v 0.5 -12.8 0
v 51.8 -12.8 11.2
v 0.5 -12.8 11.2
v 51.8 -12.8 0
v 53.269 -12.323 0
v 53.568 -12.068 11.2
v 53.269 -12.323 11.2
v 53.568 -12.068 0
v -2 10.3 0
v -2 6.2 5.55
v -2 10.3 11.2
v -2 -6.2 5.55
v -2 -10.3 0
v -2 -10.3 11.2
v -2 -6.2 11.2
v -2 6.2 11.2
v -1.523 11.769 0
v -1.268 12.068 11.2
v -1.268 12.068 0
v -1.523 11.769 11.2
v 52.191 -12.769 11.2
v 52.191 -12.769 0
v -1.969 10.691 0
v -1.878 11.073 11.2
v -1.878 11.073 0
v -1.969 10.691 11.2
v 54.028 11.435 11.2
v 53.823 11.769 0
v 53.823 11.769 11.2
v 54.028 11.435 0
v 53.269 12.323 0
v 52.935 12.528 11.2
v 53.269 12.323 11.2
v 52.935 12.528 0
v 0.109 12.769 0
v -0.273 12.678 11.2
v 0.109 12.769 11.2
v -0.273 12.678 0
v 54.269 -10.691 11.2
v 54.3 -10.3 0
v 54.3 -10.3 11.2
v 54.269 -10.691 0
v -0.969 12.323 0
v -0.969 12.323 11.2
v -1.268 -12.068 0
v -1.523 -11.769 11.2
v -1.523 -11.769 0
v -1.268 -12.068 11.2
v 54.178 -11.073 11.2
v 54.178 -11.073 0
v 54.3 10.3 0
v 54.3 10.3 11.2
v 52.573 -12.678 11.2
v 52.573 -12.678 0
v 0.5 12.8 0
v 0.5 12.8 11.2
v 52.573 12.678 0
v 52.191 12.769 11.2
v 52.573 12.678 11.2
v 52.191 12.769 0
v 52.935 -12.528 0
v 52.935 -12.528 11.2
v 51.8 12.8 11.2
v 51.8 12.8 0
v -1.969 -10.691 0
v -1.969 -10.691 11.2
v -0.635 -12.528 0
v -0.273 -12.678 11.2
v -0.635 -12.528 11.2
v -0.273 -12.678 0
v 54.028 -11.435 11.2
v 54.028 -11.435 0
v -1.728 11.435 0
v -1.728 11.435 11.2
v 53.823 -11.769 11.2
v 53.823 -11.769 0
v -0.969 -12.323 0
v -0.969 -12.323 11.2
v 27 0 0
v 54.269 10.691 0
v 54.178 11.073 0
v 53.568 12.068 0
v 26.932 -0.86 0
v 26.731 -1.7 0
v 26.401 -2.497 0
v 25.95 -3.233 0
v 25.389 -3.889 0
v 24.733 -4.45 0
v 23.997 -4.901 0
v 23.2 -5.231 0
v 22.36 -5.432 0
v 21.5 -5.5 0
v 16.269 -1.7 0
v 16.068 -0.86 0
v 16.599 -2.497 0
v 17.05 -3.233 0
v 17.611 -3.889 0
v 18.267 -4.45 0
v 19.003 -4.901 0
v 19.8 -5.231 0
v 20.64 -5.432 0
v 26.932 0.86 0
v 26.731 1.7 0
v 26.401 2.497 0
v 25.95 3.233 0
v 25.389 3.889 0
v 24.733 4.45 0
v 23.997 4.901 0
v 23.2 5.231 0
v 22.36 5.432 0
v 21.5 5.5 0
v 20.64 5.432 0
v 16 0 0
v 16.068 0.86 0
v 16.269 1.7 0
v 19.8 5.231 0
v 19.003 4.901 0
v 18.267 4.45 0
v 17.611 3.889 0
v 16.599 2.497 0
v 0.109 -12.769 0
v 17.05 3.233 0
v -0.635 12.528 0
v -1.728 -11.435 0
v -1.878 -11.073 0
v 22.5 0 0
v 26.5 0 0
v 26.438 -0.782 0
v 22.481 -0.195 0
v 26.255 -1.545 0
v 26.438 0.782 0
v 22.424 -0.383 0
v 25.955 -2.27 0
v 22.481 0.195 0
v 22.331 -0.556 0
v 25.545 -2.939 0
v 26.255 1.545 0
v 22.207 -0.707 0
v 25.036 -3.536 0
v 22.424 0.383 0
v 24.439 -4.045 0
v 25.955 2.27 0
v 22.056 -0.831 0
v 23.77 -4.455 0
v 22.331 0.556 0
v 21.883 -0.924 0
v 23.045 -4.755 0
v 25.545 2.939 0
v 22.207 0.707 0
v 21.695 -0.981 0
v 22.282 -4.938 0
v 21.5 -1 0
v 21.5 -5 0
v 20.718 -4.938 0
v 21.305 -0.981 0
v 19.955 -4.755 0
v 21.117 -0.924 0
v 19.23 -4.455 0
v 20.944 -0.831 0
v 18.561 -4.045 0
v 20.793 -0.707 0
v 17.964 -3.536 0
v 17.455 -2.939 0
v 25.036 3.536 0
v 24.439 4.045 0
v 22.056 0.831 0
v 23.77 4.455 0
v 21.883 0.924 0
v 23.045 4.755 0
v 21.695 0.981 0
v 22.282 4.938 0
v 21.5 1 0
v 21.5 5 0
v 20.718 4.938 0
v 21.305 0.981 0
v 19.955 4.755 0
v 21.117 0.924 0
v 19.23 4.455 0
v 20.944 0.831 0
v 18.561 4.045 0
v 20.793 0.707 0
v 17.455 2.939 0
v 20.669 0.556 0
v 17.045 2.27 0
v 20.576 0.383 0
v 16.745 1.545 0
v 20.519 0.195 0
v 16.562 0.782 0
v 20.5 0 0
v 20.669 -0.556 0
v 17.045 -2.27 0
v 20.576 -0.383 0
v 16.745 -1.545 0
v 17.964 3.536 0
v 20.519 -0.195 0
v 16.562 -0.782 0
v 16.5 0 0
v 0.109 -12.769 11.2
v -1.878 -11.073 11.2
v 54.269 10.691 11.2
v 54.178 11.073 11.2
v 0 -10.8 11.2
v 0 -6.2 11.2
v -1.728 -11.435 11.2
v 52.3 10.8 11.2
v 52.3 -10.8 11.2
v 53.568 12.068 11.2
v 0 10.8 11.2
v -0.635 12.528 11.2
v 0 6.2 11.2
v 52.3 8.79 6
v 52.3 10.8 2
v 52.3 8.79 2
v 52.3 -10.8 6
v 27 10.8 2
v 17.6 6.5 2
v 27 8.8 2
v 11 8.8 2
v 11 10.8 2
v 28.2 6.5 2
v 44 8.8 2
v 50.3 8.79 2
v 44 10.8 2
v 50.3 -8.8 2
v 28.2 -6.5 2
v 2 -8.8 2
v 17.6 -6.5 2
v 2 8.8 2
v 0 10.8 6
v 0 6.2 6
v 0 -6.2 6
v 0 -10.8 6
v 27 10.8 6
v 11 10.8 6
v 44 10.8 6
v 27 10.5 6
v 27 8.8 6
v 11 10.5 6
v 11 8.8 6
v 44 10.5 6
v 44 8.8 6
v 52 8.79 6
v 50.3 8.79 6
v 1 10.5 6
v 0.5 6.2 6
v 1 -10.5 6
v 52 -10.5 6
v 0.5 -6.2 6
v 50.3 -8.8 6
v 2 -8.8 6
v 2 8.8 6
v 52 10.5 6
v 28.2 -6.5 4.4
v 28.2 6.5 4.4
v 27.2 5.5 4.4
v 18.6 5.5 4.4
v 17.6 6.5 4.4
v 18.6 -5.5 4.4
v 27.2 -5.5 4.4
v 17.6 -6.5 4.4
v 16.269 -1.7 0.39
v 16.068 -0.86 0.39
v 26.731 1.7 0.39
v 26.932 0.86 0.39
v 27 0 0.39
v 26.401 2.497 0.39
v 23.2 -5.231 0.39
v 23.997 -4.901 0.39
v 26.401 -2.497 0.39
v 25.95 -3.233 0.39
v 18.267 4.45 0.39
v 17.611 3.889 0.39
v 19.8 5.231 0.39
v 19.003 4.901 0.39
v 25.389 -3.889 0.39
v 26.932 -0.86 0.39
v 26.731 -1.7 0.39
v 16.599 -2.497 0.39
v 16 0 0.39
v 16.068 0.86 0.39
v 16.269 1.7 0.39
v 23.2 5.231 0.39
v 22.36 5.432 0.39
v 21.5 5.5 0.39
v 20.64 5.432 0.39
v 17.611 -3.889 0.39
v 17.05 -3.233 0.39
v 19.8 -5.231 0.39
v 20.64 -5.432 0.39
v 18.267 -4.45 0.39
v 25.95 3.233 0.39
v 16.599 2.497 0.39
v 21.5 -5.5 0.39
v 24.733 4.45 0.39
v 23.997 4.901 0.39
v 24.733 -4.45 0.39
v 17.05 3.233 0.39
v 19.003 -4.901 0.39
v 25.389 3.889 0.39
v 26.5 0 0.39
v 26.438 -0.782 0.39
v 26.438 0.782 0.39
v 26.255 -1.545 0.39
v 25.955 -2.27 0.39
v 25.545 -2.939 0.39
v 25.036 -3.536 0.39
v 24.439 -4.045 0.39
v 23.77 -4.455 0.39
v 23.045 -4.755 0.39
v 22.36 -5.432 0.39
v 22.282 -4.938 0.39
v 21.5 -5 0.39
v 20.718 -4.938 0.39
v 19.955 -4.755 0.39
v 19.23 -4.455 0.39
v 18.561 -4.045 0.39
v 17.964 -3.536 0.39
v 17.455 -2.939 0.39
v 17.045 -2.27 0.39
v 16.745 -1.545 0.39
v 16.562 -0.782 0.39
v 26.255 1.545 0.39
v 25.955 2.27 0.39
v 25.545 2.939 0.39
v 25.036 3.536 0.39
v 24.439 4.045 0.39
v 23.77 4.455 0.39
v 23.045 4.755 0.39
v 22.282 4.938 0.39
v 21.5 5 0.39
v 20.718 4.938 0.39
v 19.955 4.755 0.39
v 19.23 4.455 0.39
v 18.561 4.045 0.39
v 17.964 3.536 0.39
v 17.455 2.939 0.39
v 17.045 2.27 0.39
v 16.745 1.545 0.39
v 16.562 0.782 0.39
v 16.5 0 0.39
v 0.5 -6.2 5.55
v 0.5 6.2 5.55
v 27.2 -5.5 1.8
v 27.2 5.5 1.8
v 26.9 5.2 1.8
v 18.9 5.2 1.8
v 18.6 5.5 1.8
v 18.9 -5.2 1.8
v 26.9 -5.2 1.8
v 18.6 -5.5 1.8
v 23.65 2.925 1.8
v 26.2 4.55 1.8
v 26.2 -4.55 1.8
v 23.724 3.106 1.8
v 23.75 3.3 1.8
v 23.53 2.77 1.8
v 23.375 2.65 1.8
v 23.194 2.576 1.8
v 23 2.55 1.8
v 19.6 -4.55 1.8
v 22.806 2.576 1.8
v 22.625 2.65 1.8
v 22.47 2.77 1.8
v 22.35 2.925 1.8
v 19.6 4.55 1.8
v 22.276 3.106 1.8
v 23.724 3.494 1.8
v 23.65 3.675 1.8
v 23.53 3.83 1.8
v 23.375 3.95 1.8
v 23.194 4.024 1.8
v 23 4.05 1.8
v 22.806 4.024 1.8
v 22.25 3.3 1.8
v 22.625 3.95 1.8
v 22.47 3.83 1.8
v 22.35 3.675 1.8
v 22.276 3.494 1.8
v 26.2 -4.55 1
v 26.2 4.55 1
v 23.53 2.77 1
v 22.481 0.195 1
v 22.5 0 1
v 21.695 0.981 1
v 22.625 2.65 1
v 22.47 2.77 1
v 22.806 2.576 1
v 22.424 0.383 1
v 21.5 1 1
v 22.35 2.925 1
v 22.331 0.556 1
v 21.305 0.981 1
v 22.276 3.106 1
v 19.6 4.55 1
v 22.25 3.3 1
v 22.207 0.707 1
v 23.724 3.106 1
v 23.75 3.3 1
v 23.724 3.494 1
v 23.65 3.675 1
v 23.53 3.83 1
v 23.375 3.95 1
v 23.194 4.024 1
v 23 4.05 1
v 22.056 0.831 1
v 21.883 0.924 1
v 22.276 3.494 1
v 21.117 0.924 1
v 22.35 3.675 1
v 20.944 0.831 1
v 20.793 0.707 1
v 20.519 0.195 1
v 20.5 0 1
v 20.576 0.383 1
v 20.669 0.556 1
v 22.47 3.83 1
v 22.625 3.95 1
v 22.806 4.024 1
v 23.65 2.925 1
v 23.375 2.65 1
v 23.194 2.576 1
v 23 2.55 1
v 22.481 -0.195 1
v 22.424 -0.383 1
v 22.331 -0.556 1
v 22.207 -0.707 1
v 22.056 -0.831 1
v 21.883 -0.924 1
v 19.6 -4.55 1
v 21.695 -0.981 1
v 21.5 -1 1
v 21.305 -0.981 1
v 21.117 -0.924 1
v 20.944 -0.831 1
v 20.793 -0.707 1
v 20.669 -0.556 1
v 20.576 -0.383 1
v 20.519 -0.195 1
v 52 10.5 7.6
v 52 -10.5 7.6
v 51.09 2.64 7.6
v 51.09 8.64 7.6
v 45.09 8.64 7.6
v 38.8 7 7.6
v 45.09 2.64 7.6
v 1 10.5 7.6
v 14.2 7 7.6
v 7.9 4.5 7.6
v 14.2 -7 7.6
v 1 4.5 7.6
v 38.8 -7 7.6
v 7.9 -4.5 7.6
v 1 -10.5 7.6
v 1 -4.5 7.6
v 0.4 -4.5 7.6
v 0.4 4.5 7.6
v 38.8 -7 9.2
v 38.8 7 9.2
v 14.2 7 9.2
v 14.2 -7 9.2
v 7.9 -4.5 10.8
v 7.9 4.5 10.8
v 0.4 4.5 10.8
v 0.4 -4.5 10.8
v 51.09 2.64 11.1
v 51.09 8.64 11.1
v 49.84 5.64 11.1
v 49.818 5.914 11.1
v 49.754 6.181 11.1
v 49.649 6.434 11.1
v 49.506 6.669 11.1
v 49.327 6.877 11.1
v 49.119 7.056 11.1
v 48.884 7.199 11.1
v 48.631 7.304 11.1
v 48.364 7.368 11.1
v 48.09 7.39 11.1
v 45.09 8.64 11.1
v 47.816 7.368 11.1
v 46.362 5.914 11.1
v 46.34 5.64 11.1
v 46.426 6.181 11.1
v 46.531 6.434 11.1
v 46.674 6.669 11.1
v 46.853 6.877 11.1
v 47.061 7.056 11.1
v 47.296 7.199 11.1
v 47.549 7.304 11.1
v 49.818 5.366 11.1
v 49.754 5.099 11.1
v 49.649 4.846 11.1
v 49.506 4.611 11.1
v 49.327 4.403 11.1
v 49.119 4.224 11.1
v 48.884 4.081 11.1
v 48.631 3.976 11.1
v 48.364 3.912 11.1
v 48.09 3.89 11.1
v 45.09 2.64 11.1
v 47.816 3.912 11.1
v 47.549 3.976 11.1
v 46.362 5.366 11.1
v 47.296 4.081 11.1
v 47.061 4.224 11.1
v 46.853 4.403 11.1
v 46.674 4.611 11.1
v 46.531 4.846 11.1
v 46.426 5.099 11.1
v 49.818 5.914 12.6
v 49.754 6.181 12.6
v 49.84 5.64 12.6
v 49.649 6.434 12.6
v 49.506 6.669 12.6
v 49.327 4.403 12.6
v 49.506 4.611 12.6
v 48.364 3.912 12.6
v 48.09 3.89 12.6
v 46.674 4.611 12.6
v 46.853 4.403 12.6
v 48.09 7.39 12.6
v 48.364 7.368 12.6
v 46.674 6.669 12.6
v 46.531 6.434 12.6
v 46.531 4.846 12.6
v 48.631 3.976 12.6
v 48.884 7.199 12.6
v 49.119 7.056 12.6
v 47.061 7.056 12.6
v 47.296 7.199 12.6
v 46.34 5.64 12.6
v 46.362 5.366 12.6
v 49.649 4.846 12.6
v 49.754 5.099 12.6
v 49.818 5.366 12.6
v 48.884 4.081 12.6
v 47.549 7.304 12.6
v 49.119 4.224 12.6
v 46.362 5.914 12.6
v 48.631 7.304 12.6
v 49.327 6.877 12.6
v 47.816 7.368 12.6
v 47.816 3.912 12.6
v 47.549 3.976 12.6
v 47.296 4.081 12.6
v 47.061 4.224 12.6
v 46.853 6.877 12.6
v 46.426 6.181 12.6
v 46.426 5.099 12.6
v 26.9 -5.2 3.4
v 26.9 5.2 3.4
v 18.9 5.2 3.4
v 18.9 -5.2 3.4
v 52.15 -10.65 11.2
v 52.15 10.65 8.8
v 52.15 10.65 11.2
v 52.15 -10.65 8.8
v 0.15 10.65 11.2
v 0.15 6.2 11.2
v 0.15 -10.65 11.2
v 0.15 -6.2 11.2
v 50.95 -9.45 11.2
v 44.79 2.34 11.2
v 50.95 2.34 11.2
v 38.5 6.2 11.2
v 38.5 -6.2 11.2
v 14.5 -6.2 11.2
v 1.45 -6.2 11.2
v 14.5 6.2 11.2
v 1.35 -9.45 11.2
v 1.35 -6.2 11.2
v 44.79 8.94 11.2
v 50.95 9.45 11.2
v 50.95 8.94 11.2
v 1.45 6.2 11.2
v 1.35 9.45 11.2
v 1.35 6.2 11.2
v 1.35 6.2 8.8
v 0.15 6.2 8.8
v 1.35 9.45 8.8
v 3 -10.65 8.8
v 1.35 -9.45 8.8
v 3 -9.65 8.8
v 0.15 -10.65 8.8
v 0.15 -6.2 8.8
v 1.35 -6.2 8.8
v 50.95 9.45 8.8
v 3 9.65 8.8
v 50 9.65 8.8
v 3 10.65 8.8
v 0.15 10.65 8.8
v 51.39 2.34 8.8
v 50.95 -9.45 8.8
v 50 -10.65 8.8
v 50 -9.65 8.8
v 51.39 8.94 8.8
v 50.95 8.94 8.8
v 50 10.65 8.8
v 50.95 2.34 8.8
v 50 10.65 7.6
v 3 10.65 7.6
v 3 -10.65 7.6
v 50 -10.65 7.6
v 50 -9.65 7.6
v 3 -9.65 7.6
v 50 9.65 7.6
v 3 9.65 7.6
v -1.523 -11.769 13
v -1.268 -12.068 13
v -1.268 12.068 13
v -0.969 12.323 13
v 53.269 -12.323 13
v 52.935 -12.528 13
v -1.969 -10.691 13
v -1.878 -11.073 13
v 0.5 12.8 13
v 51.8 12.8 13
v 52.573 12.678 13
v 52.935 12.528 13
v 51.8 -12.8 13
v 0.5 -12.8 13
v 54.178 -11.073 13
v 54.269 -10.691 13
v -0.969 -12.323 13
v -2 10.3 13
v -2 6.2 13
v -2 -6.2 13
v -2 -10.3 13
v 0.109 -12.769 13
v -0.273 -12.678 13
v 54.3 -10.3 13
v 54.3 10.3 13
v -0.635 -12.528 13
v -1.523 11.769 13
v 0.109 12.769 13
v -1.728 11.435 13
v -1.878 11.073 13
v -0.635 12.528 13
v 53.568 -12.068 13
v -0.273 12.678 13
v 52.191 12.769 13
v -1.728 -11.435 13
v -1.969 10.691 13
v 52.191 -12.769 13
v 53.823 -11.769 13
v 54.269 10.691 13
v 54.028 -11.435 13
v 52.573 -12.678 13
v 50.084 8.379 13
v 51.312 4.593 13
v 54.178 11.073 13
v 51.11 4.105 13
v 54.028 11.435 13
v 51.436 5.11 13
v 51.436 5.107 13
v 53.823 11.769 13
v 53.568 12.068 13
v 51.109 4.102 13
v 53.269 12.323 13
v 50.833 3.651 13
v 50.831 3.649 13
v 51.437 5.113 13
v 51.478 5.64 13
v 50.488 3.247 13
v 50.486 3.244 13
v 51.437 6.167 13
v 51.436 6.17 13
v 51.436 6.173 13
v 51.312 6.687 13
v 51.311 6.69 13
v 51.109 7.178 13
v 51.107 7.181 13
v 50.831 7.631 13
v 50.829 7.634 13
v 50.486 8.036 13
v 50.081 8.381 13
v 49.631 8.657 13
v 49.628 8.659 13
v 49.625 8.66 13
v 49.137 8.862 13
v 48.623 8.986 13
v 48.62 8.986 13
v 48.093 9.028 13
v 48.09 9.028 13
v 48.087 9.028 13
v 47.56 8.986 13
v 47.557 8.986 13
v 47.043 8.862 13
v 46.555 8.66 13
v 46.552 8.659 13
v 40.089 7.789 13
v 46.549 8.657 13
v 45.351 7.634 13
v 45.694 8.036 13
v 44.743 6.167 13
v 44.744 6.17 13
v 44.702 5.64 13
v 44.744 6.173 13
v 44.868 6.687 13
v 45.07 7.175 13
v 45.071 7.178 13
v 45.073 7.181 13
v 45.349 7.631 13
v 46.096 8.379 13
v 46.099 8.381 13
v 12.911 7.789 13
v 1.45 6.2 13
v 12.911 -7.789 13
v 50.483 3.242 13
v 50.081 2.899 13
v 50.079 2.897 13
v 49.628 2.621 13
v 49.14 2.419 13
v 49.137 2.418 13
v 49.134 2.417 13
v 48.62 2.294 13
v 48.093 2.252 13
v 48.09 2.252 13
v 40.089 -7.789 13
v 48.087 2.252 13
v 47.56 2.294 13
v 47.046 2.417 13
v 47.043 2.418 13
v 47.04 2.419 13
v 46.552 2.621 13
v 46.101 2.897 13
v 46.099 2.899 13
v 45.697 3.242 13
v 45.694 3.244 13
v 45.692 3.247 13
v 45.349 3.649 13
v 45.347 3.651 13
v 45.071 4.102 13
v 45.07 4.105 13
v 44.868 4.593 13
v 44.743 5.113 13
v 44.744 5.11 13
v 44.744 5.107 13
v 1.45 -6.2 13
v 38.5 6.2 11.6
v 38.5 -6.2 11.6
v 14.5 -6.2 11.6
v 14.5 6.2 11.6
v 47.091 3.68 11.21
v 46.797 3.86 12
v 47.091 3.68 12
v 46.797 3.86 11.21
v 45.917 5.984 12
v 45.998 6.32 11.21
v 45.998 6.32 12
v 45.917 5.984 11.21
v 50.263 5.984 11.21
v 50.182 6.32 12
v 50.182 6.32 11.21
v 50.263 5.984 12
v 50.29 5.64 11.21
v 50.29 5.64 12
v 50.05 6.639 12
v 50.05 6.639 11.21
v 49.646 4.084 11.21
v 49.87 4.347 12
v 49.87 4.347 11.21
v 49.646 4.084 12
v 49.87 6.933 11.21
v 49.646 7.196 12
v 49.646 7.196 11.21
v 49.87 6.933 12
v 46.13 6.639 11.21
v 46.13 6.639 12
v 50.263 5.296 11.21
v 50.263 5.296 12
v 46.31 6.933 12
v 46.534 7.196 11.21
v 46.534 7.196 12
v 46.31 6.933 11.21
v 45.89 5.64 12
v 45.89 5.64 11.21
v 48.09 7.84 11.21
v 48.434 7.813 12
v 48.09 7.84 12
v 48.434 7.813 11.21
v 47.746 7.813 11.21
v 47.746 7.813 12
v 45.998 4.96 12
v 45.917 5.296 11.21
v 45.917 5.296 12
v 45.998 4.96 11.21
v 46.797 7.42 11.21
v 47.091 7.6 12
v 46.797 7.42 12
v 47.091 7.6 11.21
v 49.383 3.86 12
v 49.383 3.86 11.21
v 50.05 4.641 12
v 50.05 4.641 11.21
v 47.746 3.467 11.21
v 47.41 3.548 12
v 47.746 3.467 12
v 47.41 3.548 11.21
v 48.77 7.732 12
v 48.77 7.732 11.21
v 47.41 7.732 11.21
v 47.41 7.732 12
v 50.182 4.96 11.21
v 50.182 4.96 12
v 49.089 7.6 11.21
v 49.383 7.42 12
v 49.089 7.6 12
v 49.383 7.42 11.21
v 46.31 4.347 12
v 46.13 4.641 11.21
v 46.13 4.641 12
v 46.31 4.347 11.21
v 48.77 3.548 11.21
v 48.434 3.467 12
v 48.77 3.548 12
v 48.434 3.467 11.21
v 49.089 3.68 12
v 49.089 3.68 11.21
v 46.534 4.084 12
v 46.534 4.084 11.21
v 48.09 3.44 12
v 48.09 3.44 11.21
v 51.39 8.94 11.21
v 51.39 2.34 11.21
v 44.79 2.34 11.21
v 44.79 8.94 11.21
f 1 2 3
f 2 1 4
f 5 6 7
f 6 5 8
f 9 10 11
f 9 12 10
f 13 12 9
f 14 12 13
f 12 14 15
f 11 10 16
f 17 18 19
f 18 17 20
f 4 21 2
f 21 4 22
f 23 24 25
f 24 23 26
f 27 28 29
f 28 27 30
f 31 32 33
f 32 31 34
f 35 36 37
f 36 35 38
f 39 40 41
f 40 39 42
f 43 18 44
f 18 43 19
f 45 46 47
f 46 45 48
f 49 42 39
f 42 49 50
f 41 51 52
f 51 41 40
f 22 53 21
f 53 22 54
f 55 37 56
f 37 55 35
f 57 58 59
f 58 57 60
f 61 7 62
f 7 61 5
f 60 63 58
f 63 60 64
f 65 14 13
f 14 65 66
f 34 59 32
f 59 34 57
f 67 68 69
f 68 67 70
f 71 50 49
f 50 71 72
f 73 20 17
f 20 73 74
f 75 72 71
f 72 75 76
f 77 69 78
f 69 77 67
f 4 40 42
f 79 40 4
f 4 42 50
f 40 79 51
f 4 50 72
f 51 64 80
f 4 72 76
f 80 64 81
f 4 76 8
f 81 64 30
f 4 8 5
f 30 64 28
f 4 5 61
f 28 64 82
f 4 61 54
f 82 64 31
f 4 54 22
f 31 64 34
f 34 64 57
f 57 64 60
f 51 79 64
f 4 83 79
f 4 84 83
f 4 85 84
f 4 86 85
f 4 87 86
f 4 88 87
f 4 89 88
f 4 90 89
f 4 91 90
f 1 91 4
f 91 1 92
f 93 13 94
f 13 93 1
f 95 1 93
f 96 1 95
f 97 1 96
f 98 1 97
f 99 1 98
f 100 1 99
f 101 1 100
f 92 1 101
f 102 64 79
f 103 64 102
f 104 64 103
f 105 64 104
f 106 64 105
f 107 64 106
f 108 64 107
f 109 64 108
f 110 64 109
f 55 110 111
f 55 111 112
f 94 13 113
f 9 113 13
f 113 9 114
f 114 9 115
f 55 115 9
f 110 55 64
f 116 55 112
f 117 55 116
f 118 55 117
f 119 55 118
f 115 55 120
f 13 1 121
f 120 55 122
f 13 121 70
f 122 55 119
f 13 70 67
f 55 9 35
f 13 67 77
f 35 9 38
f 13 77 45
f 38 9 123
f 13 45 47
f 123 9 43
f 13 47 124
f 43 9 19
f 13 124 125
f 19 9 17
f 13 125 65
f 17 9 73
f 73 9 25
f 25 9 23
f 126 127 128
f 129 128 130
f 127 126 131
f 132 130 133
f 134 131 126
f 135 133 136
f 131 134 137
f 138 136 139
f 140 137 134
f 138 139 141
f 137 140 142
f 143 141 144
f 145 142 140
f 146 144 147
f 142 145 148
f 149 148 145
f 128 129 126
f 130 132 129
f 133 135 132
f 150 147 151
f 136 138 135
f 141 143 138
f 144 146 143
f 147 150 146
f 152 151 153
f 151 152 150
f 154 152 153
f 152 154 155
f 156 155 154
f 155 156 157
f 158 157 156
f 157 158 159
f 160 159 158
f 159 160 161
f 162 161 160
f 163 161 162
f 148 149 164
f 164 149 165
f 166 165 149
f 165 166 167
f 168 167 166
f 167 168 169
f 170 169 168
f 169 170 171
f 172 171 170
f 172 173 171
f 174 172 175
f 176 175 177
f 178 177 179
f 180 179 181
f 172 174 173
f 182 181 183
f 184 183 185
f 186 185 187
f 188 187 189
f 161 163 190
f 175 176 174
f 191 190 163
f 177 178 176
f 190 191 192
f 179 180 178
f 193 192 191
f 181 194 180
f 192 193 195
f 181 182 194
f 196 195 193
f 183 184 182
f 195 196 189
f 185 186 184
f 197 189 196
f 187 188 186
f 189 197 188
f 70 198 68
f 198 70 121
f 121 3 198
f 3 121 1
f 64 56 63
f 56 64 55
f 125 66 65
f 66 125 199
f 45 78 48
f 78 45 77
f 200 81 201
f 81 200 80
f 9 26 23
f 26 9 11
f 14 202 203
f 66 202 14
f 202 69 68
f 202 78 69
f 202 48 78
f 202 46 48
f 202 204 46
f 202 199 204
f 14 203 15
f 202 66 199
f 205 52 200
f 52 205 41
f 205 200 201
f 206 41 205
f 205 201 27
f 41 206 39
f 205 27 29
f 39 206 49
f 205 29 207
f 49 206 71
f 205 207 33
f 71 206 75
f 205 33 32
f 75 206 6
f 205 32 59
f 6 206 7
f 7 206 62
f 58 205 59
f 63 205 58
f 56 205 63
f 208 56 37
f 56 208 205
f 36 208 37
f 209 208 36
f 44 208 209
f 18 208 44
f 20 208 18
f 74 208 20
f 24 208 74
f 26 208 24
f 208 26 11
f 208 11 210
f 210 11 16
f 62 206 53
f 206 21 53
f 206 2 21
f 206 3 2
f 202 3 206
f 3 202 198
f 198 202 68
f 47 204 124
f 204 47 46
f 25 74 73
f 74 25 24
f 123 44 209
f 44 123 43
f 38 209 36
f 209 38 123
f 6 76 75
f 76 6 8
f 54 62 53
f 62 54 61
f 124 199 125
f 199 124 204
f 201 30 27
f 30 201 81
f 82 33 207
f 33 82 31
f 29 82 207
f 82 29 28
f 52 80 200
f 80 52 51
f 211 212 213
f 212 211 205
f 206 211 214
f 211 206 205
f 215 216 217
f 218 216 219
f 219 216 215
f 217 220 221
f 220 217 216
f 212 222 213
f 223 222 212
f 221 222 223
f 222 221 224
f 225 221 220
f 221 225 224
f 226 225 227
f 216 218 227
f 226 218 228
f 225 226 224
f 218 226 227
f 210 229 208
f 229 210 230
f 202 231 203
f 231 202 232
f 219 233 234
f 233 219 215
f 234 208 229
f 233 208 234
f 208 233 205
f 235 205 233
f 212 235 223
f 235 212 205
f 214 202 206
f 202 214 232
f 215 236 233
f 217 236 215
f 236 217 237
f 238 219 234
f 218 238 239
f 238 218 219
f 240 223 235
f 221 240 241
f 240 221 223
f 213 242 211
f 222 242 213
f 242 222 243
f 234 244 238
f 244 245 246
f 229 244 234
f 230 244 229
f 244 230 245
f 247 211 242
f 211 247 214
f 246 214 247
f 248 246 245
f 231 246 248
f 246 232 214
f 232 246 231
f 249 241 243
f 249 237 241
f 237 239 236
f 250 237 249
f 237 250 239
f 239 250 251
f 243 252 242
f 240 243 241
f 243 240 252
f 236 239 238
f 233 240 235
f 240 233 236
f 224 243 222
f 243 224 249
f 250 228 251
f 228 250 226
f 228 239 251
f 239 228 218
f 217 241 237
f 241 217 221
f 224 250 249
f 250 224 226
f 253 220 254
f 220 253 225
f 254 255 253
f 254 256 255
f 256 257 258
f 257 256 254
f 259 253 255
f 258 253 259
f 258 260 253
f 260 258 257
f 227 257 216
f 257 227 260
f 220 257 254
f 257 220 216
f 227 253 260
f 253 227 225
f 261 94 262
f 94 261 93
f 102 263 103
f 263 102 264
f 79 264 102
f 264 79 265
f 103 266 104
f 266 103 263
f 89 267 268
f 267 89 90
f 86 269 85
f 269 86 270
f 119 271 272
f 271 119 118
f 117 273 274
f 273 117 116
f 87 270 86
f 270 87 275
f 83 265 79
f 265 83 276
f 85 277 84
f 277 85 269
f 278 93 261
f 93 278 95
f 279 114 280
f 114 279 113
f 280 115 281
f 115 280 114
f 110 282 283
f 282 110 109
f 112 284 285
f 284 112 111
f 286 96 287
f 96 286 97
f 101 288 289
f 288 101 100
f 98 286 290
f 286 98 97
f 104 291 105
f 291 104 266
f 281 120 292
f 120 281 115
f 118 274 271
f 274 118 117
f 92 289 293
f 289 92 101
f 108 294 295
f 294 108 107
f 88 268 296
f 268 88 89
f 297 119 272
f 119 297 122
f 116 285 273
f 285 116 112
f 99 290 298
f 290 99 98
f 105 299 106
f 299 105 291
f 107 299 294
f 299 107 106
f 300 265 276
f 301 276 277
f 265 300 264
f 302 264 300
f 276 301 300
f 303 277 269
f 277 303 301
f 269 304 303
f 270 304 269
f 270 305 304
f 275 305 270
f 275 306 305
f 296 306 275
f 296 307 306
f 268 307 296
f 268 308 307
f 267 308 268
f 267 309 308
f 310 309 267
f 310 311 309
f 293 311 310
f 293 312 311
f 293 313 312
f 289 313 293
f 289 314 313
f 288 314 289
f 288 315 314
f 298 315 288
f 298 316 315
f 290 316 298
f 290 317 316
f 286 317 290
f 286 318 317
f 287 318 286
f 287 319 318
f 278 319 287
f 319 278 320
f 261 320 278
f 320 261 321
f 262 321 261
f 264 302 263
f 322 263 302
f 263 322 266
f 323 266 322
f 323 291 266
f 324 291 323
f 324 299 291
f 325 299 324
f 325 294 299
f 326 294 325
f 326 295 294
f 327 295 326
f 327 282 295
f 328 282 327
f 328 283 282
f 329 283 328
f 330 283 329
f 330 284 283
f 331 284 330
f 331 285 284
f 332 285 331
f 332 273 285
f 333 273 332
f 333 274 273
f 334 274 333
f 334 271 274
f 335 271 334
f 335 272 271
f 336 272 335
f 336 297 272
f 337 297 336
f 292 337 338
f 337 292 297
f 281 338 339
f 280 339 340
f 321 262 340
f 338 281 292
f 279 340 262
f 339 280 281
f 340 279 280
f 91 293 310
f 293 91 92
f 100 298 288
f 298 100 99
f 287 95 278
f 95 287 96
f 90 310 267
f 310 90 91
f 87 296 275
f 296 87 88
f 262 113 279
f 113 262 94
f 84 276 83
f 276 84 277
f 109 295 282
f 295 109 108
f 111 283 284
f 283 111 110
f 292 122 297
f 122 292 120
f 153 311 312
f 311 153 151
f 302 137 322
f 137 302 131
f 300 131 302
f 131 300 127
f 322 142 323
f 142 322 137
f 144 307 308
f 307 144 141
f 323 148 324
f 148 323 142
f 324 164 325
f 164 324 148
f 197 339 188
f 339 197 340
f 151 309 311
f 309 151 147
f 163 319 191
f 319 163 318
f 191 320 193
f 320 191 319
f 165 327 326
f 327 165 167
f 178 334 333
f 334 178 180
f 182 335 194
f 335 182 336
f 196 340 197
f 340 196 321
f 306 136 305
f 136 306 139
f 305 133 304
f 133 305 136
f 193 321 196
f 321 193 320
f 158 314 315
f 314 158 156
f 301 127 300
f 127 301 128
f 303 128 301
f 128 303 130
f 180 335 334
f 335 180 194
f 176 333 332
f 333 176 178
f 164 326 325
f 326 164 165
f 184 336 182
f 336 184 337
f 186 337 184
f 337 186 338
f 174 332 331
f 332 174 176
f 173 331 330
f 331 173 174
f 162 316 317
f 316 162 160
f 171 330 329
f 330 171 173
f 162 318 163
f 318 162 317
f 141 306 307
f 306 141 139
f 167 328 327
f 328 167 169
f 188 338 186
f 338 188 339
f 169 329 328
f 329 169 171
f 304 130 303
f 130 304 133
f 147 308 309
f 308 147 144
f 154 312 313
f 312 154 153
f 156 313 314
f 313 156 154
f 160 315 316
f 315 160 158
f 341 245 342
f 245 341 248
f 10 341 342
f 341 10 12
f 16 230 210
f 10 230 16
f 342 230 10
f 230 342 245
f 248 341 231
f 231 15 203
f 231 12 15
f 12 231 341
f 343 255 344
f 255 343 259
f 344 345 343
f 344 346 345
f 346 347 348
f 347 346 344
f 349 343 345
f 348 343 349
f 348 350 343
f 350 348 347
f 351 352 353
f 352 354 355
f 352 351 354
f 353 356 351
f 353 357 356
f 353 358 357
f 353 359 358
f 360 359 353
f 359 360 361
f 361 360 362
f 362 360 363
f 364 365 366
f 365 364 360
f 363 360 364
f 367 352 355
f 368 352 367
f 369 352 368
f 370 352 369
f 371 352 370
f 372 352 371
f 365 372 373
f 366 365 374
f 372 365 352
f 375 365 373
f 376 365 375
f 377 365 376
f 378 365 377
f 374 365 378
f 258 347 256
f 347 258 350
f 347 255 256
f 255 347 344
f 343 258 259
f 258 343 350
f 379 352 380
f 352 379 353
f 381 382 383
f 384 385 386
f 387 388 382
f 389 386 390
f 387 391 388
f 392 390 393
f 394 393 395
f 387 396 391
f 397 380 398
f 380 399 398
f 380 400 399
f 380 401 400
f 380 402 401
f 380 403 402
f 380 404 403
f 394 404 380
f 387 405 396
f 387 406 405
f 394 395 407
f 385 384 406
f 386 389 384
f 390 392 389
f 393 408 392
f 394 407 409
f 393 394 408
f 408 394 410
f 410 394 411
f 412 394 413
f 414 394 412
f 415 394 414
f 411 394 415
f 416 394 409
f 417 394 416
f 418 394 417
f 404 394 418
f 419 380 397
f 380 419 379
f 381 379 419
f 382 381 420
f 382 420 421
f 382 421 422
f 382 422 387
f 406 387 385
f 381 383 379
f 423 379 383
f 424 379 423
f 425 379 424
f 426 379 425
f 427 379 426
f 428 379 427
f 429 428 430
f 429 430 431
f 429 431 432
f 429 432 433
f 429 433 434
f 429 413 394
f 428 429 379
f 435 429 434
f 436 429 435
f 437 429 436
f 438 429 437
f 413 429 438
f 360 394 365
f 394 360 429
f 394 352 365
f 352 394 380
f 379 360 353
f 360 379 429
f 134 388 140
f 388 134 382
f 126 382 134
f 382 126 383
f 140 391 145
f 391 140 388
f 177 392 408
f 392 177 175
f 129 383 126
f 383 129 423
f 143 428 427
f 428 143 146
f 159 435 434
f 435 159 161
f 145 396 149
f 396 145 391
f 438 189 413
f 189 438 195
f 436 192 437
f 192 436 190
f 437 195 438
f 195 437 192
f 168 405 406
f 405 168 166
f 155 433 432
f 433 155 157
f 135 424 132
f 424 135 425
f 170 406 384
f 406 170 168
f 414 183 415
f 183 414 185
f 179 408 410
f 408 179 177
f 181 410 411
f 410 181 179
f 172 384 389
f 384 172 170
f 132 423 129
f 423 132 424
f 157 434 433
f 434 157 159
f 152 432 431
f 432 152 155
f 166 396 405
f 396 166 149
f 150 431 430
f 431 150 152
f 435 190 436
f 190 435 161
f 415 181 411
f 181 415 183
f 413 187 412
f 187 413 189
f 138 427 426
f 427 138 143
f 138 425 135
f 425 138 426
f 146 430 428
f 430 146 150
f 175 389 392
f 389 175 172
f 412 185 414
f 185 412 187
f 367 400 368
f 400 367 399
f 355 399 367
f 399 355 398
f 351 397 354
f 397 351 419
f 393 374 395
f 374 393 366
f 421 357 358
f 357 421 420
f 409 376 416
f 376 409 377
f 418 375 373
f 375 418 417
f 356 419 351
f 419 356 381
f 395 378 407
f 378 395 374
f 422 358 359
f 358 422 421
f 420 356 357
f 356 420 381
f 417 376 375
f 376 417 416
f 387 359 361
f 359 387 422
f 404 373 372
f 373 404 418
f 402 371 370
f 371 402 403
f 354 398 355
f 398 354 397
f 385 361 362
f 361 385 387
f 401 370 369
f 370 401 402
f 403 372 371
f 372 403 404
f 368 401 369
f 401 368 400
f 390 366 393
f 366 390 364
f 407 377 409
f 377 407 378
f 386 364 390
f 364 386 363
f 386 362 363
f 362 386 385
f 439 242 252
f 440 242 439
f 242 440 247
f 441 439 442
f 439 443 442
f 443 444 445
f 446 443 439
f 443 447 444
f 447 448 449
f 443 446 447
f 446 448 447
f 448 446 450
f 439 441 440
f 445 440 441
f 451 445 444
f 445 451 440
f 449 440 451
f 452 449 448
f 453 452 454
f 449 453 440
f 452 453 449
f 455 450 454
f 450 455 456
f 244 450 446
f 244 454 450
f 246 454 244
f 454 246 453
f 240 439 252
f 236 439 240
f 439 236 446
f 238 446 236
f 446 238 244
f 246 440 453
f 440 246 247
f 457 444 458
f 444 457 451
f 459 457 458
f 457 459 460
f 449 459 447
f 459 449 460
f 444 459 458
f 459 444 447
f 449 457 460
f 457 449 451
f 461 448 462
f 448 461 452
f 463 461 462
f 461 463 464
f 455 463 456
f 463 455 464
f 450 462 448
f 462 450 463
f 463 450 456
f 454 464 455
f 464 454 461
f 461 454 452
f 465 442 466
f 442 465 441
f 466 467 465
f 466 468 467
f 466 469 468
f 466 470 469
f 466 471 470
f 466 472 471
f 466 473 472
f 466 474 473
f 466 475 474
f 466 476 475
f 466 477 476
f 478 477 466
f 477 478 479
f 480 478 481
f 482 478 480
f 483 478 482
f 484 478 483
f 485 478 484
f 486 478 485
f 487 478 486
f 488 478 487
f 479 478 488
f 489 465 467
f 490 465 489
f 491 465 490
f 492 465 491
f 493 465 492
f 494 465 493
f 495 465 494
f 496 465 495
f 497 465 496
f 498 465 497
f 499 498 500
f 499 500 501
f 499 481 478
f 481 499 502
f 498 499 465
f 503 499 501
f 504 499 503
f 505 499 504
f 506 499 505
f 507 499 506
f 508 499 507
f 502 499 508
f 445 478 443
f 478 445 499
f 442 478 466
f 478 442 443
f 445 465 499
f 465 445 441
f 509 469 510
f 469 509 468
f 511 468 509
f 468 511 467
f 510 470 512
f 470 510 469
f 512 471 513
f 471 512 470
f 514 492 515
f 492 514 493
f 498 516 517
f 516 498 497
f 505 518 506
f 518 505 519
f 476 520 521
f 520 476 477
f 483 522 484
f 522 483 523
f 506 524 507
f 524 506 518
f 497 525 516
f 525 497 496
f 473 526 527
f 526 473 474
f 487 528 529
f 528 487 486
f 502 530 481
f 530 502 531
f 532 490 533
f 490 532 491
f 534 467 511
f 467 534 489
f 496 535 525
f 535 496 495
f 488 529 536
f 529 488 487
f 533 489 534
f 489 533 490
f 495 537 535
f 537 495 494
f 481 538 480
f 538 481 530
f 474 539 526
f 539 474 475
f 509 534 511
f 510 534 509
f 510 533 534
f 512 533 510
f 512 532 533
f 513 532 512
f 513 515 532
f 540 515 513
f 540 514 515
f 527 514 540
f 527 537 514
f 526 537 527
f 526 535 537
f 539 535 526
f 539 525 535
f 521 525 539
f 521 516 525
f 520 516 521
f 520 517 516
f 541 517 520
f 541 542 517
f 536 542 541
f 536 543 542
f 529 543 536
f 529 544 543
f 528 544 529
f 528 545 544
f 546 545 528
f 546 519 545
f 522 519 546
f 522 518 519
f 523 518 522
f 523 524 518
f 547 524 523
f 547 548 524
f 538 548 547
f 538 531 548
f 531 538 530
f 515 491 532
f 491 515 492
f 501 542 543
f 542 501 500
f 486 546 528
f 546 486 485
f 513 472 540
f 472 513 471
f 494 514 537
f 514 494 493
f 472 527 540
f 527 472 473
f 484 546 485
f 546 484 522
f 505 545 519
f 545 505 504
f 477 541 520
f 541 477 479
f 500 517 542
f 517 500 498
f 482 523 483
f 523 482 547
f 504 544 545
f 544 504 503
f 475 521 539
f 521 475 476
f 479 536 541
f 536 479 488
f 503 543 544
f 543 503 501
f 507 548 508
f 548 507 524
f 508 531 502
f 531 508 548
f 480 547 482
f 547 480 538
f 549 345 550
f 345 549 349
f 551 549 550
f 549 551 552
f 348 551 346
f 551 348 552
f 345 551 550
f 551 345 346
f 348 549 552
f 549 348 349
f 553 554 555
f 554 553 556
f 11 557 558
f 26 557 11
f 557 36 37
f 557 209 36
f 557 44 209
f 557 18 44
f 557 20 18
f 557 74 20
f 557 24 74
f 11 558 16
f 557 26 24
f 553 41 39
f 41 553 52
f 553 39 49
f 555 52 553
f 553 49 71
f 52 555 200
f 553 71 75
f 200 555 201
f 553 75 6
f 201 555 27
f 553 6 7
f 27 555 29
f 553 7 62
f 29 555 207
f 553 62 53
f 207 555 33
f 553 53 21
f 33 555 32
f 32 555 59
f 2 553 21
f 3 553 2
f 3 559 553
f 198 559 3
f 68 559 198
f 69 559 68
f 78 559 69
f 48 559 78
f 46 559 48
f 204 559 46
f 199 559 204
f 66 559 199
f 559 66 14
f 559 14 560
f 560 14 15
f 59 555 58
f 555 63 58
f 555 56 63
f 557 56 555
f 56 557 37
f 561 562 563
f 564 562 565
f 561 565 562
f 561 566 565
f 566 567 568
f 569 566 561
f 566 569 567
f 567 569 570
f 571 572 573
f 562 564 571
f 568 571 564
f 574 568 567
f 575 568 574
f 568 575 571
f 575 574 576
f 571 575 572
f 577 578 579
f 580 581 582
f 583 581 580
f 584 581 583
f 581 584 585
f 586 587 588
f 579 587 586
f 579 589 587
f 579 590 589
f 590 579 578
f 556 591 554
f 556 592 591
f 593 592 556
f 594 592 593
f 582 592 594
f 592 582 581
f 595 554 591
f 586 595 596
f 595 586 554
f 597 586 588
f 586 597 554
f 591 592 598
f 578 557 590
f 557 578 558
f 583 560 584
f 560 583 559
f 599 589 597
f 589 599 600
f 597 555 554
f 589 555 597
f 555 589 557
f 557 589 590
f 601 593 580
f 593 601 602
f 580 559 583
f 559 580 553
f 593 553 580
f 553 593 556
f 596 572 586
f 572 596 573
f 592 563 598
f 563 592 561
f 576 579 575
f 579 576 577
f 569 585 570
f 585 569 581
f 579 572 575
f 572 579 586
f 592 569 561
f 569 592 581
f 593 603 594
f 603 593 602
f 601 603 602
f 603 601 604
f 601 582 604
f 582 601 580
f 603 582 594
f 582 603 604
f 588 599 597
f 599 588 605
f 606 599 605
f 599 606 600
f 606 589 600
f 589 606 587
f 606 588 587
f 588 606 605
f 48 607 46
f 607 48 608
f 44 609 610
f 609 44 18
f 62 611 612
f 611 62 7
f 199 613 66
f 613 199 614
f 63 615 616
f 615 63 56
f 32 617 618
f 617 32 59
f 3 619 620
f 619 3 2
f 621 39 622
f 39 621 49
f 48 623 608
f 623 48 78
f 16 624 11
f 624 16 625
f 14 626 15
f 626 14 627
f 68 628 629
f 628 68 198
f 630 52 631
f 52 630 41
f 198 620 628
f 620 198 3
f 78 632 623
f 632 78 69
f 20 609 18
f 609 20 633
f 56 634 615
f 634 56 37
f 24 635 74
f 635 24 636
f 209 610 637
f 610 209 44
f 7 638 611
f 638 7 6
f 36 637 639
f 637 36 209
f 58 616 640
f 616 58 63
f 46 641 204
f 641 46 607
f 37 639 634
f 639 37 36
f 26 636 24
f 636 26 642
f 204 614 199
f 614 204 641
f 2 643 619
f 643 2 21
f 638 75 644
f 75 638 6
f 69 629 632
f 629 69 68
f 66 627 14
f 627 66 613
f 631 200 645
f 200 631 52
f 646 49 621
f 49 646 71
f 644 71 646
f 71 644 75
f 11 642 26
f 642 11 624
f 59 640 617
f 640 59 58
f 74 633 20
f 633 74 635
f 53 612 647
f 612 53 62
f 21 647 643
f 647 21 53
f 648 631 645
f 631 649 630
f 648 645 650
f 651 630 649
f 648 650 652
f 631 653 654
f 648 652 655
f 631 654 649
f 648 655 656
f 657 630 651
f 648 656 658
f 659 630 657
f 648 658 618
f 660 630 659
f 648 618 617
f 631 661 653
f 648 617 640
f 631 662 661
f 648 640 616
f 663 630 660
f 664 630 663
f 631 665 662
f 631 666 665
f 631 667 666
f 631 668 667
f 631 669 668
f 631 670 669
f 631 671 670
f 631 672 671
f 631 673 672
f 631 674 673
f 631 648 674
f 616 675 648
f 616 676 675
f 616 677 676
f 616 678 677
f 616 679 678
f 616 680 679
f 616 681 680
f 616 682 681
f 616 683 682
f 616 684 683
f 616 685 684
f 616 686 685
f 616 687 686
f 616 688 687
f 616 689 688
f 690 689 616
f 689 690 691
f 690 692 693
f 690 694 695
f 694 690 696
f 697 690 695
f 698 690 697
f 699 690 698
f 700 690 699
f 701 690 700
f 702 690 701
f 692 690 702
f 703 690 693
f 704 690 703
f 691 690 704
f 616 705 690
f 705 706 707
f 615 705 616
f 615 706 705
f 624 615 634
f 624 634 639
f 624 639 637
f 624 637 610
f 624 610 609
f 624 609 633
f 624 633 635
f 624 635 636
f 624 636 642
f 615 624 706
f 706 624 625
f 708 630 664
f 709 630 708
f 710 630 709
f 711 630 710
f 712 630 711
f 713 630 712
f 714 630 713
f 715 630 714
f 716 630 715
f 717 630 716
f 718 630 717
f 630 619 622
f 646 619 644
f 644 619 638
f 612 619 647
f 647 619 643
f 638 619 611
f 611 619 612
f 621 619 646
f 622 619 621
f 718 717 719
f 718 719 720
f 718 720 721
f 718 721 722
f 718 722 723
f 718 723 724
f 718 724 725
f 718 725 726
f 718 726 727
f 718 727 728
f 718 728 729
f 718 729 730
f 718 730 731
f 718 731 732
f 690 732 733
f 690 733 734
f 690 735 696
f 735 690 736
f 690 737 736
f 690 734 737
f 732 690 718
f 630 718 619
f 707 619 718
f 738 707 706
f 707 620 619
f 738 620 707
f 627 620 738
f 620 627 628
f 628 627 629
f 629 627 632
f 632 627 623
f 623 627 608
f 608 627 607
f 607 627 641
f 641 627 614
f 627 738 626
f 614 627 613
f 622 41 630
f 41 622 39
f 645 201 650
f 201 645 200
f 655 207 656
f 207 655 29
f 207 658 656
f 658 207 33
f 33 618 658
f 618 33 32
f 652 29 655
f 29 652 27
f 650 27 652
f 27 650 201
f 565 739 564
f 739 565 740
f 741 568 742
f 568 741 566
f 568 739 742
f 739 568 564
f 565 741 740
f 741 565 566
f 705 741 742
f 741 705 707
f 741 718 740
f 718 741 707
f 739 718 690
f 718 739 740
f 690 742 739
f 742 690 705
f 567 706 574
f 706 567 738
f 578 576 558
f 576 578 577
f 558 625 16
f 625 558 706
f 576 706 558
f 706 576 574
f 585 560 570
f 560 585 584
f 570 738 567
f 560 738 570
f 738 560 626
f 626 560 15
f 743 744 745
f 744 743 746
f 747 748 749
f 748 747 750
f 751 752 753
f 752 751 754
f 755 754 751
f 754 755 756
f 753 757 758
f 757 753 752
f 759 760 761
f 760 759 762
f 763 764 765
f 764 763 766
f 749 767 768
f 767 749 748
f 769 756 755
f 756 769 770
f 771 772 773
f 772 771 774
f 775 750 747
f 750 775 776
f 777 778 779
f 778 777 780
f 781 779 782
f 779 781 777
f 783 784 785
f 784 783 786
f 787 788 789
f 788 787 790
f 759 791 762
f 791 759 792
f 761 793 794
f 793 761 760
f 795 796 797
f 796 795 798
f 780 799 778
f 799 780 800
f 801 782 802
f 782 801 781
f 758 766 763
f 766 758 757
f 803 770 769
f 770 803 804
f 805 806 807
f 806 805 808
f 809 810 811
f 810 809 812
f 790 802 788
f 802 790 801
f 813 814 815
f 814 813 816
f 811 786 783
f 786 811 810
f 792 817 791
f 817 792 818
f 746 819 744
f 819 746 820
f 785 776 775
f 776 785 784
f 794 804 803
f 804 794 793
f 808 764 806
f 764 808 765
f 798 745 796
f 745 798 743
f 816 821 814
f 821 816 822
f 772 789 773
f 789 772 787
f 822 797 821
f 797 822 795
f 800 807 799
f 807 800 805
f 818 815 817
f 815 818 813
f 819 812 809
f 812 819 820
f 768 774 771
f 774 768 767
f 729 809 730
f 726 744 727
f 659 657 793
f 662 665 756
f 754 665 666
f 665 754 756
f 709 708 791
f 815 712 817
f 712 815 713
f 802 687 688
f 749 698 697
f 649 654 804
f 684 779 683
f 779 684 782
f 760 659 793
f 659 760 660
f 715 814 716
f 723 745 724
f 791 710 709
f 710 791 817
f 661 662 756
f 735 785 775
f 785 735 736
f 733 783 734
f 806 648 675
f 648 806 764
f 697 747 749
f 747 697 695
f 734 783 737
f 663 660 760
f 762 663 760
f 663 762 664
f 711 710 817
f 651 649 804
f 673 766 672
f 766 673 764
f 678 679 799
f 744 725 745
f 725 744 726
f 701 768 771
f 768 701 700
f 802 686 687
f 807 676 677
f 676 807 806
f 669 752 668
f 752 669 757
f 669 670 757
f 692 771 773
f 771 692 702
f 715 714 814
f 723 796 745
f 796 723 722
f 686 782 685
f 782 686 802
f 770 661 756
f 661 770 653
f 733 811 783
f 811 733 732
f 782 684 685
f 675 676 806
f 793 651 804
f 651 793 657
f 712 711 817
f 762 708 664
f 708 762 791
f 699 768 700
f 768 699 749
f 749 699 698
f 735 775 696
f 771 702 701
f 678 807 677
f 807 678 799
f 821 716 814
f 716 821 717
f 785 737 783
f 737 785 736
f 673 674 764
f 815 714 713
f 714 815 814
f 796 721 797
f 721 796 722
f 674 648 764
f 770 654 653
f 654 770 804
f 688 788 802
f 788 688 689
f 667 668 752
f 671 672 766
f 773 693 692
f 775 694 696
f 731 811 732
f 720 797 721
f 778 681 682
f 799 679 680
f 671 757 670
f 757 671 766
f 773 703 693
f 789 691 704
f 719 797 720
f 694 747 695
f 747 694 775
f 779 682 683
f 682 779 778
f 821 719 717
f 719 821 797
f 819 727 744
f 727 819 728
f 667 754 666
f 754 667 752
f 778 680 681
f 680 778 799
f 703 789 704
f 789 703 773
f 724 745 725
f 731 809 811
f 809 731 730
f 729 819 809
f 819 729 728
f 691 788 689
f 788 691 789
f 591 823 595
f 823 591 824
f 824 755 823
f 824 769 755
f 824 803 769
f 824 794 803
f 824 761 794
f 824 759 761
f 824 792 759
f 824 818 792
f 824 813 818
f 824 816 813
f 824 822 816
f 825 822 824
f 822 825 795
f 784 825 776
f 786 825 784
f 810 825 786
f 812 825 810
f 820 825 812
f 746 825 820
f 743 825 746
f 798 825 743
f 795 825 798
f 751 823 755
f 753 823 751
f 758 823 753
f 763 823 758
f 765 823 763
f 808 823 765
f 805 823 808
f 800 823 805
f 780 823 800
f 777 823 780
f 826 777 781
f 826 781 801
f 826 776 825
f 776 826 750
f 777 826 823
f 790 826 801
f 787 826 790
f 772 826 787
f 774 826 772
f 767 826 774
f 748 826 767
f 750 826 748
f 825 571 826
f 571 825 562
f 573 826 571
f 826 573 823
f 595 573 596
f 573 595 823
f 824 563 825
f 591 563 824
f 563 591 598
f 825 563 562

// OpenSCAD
// Latency tester v3 case - Waveshare RP2040-LCD-0.96 + ALS-PT19 + 6x6 button
// The screen faces you through the lid; the light sensor looks out of the flat
// back. Hold the back against the monitor. The button is soldered straight onto
// the board (legs in pins 21 GP16 and 23 GND, body towards the middle of the
// board) and pokes through a hole in the lid. The light sensor lies face-down in
// a pocket in the back, under the board.
//
// About 57 x 26 x 13 mm. Screwless: the lid's lip is a push fit (a drop of glue
// or a strip of tape if it's loose on your printer).
//
// Parts (set PART):
//   "base" - back: board ledge, USB-C opening, sensor pocket
//   "lid"  - front: screen window, button hole. Exported face-down, ready to print.
//   "all"  - assembly preview
//
// Wiring: no header pins on the board (solder wires into the holes from
// underneath). If your board has pins soldered on, set under = 9.5.
//
// CHECK BEFORE PRINTING - measure your board and set these if they differ:
//   scr_x    distance from the board's USB end to the centre of the screen
//   scr_y    offset of the screen centre across the board (0 = centred)
//   btn_x    distance from the board's USB end to the centre of the button stem
//   btn_y    stem centre from the board's centre line, towards the pin 21-40 edge
//   tact_h   button height, bottom of the body to the top of the stem
//   sens_x   where the sensor sits under the board, from the USB end - keep it
//   sens_y   clear of anything on the board's underside (battery socket)

PART = "all";
$fn = 40;

// ---------- board ----------
bd = [51, 21];          // board outline (x along the length, USB at x = 0)
bd_t = 1.6;             // PCB thickness
top_h = 3.6;            // tallest part on top (USB-C, screen, BOOT/RESET) + clearance
under = 4;              // space under the board for wire ends
fit = 0.3;              // board clearance
scr_x = 25.5;           // screen centre from the USB end
scr_y = 0;
scr_win = [24, 12.4];   // window at the screen (active area is 21.7 x 10.8)
usb_w = 12.4;           // USB-C plug overmould width
usb_h = 7.4;            // ... and height

// ---------- case ----------
wall = 2;
floor_t = 2;
lid_t = 1.8;
lip = 1.2;              // lid lip width
lip_d = 2.4;            // lid lip depth
lid_fit = 0.15;         // lip clearance (push fit)

// ---------- button (standard 6 x 6 mm tactile, 4 legs) on the board ----------
// Pins 21 and 23 are 5.08 mm apart; with those two legs in them the stem sits
// 3.25 mm in from the pin row.
btn_x = 25.5 + (24.13 + 19.05) / 2;     // = 47.1, midway between pins 21 and 23
btn_y = 8.89 - 3.25;                    // = 5.64
tact_h = 5;             // 5 mm button: stem top ends 0.4 mm under the lid face
btn_hole = 4.4;         // stem is 3.5 mm
btn_body = 6.6;         // clearance for the 6 x 6 body under the lid

// ---------- ALS-PT19 (Adafruit 2748) ----------
// Pocket: the breakout lies face-down on a ledge; a smaller recess under it
// clears the sensor chip; a 2 mm hole lets the light in; a peg goes through
// the breakout's mounting hole to line it up.
als = [8.0, 10.4];      // breakout size, long side across the case
sens_x = 21.9;          // pocket centre from the board's USB end
sens_y = 0;
als_fit = 0.3;
als_frame = 1.0;
als_skin = 1.0;         // back thickness under the chip
als_ledge = 1.8;        // height of the ledge the breakout rests on
als_recess = [6.6, 9.1];// chip recess
win_d = 2.0;            // light hole
win_off = [-1.4, 0];    // light hole from the pocket centre
peg_d = 1.5;            // locating peg
peg_off = [0.1, 3.3];
peg_h = 1.4;            // above the ledge (breakout PCB is 1.6)

// ---------- board ledge ----------
ledge_w = 2.0;          // ledge round the inside the board rests on
// gaps in the ledge for solder joints under the board (pins 31-36 sensor wires,
// pins 21-23 button legs), x from the board's USB end, on the pin 21-40 side
ledge_gaps = [[10, 26], [43, 51.5]];

// =====================================================================
bx0 = 1.0;                              // board starts 1 mm from the USB wall (connector overhang)
bx1 = bx0 + bd[0];
iy = bd[1]/2 + fit;                     // inner half width
Li = bx1 + fit;                         // inner length (end wall stops the board)
L = Li + 2*wall;
W = 2*iy + 2*wall;
bz0 = floor_t + under;                  // board bottom
bz1 = bz0 + bd_t;                       // board top
H = bz1 + top_h;                        // base height = lid underside
tact_c = [bx0 + btn_x, btn_y];
sens_c = [bx0 + sens_x, sens_y];
body_top = bz1 + 3.6;                   // top of the 6 x 6 body
usb_z = bz1 + 1.65;                     // USB-C centre (top-mounted receptacle)

module rbox(x0, y0, sx, sy, sz, r = 2) {
    hull() for (x = [x0 + r, x0 + sx - r], y = [y0 + r, y0 + sy - r])
        translate([x, y, 0]) cylinder(r = r, h = sz);
}

module base() {
    difference() {
        union() {
            difference() {
                rbox(-wall, -iy - wall, L, W, H, 2.5);
                translate([0, -iy, floor_t]) cube([Li, 2*iy, H]);
            }
            // ledge round the inside, the board rests on it
            difference() {
                translate([0, -iy, 0]) cube([Li, 2*iy, bz0]);
                translate([ledge_w, -iy + ledge_w, floor_t]) cube([Li - 2*ledge_w, 2*iy - 2*ledge_w, bz0]);
                for (g = ledge_gaps)
                    translate([bx0 + g[0], iy - ledge_w - 0.01, floor_t]) cube([g[1] - g[0], ledge_w + 0.02, bz0]);
            }
            // sensor frame (its top stays 1.6 mm under the board)
            fx = als[0] + 2*als_fit + 2*als_frame;
            fy = als[1] + 2*als_fit + 2*als_frame;
            translate([sens_c[0] - fx/2, sens_c[1] - fy/2, 0]) cube([fx, fy, floor_t + 2.4]);
        }
        // USB-C: open-topped slot in the end wall
        translate([-wall - 1, scr_y_usb() - usb_w/2, usb_z - usb_h/2]) cube([wall + 1.5, usb_w, H]);
        // sensor pocket: breakout on a ledge, chip recess under it, light hole
        px = als[0] + 2*als_fit;  py = als[1] + 2*als_fit;
        translate([sens_c[0] - px/2, sens_c[1] - py/2, als_ledge]) cube([px, py, 10]);
        translate([sens_c[0] - als_recess[0]/2, sens_c[1] - als_recess[1]/2, als_skin]) cube([als_recess[0], als_recess[1], 10]);
        translate([sens_c[0] + win_off[0], sens_c[1] + win_off[1], -1]) cylinder(d = win_d, h = als_skin + 1.01, $fn = 32);
        // ring on the back marking the sensor, for a foam/felt gasket
        translate([sens_c[0] + win_off[0], sens_c[1] + win_off[1], -0.01]) difference() { cylinder(d = 11, h = 0.4); cylinder(d = 10, h = 1); }
    }
    // locating peg for the breakout's mounting hole
    translate([sens_c[0] + peg_off[0], sens_c[1] + peg_off[1], als_skin])
        cylinder(d = peg_d, h = als_ledge - als_skin + peg_h, $fn = 24);
}

function scr_y_usb() = 0;   // USB-C is centred across the board

module lid() {
    difference() {
        union() {
            rbox(-wall, -iy - wall, L, W, lid_t, 2.5);
            // push-fit lip
            difference() {
                translate([lid_fit, -iy + lid_fit, -lip_d]) cube([Li - 2*lid_fit, 2*iy - 2*lid_fit, lip_d]);
                translate([lid_fit + lip, -iy + lid_fit + lip, -lip_d - 1]) cube([Li - 2*lid_fit - 2*lip, 2*iy - 2*lid_fit - 2*lip, lip_d + 1]);
            }
            // rails that hold the board down along its long edges
            for (s = [-1, 1])
                translate([bx0 + 2, s > 0 ? iy - lid_fit - 1.0 : -iy + lid_fit, -top_h]) cube([bd[0] - 4, 1.0, top_h]);
        }
        // screen window, chamfered towards the viewer
        translate([bx0 + scr_x, scr_y, -top_h - 1]) {
            translate([-scr_win[0]/2, -scr_win[1]/2, 0]) cube([scr_win[0], scr_win[1], top_h + 1 + lid_t + 1]);
            translate([0, 0, top_h + 1 + 0.4])
                hull() {
                    translate([-scr_win[0]/2, -scr_win[1]/2, 0]) cube([scr_win[0], scr_win[1], 0.01]);
                    translate([-scr_win[0]/2 - 1.6, -scr_win[1]/2 - 1.6, lid_t - 0.4 + 0.01]) cube([scr_win[0] + 3.2, scr_win[1] + 3.2, 0.5]);
                }
        }
        // USB-C notch in the lid edge (matches the slot in the base)
        translate([-wall - 1, -usb_w/2, -lip_d - 1]) cube([wall + 1 + lid_fit + lip + 0.1, usb_w, lid_t + lip_d + 2]);
        // button: hole for the stem, countersunk so a finger reaches it
        translate([tact_c[0], tact_c[1], -1]) cylinder(d = btn_hole, h = lid_t + 2);
        translate([tact_c[0], tact_c[1], lid_t - 1.0]) cylinder(d1 = btn_hole, d2 = btn_hole + 2.4, h = 1.01);
        // clear the button body (and the rail) around it
        translate([tact_c[0] - btn_body/2, tact_c[1] - btn_body/2, -top_h - 1]) cube([btn_body, btn_body, top_h + 1 + max(0, body_top - H) + 0.01]);
    }
}

// rough board + parts, for the preview only
module board_preview() {
    color("DarkGreen") translate([bx0, -bd[1]/2, bz0]) cube([bd[0], bd[1], bd_t]);
    color("Black") translate([bx0 + scr_x - 12.3, scr_y - 7, bz1]) cube([24.6, 14, 1.6]);
    color("Silver") translate([bx0 - 0.6, -4.5, bz1]) cube([7.5, 9, 3.2]);
    color("Black") translate([tact_c[0] - 3, tact_c[1] - 3, bz1]) cube([6, 6, 3.5]);
    color("DimGray") translate([tact_c[0], tact_c[1], bz1]) cylinder(d = 3.5, h = tact_h);
    color("Purple") translate([sens_c[0] - als[0]/2, sens_c[1] - als[1]/2, als_ledge]) cube([als[0], als[1], 1.6]);
}

if (PART == "base") base();
else if (PART == "lid") translate([0, 0, lid_t]) mirror([0, 0, 1]) lid();
else if (PART == "open") {
    color("SteelBlue") base();
    board_preview();
    color("LightGray", 0.9) translate([0, W + 6, lid_t]) mirror([0, 0, 1]) lid();
} else {
    color("SteelBlue") base();
    board_preview();
    color("LightGray", 0.85) translate([0, 0, H]) lid();
}
